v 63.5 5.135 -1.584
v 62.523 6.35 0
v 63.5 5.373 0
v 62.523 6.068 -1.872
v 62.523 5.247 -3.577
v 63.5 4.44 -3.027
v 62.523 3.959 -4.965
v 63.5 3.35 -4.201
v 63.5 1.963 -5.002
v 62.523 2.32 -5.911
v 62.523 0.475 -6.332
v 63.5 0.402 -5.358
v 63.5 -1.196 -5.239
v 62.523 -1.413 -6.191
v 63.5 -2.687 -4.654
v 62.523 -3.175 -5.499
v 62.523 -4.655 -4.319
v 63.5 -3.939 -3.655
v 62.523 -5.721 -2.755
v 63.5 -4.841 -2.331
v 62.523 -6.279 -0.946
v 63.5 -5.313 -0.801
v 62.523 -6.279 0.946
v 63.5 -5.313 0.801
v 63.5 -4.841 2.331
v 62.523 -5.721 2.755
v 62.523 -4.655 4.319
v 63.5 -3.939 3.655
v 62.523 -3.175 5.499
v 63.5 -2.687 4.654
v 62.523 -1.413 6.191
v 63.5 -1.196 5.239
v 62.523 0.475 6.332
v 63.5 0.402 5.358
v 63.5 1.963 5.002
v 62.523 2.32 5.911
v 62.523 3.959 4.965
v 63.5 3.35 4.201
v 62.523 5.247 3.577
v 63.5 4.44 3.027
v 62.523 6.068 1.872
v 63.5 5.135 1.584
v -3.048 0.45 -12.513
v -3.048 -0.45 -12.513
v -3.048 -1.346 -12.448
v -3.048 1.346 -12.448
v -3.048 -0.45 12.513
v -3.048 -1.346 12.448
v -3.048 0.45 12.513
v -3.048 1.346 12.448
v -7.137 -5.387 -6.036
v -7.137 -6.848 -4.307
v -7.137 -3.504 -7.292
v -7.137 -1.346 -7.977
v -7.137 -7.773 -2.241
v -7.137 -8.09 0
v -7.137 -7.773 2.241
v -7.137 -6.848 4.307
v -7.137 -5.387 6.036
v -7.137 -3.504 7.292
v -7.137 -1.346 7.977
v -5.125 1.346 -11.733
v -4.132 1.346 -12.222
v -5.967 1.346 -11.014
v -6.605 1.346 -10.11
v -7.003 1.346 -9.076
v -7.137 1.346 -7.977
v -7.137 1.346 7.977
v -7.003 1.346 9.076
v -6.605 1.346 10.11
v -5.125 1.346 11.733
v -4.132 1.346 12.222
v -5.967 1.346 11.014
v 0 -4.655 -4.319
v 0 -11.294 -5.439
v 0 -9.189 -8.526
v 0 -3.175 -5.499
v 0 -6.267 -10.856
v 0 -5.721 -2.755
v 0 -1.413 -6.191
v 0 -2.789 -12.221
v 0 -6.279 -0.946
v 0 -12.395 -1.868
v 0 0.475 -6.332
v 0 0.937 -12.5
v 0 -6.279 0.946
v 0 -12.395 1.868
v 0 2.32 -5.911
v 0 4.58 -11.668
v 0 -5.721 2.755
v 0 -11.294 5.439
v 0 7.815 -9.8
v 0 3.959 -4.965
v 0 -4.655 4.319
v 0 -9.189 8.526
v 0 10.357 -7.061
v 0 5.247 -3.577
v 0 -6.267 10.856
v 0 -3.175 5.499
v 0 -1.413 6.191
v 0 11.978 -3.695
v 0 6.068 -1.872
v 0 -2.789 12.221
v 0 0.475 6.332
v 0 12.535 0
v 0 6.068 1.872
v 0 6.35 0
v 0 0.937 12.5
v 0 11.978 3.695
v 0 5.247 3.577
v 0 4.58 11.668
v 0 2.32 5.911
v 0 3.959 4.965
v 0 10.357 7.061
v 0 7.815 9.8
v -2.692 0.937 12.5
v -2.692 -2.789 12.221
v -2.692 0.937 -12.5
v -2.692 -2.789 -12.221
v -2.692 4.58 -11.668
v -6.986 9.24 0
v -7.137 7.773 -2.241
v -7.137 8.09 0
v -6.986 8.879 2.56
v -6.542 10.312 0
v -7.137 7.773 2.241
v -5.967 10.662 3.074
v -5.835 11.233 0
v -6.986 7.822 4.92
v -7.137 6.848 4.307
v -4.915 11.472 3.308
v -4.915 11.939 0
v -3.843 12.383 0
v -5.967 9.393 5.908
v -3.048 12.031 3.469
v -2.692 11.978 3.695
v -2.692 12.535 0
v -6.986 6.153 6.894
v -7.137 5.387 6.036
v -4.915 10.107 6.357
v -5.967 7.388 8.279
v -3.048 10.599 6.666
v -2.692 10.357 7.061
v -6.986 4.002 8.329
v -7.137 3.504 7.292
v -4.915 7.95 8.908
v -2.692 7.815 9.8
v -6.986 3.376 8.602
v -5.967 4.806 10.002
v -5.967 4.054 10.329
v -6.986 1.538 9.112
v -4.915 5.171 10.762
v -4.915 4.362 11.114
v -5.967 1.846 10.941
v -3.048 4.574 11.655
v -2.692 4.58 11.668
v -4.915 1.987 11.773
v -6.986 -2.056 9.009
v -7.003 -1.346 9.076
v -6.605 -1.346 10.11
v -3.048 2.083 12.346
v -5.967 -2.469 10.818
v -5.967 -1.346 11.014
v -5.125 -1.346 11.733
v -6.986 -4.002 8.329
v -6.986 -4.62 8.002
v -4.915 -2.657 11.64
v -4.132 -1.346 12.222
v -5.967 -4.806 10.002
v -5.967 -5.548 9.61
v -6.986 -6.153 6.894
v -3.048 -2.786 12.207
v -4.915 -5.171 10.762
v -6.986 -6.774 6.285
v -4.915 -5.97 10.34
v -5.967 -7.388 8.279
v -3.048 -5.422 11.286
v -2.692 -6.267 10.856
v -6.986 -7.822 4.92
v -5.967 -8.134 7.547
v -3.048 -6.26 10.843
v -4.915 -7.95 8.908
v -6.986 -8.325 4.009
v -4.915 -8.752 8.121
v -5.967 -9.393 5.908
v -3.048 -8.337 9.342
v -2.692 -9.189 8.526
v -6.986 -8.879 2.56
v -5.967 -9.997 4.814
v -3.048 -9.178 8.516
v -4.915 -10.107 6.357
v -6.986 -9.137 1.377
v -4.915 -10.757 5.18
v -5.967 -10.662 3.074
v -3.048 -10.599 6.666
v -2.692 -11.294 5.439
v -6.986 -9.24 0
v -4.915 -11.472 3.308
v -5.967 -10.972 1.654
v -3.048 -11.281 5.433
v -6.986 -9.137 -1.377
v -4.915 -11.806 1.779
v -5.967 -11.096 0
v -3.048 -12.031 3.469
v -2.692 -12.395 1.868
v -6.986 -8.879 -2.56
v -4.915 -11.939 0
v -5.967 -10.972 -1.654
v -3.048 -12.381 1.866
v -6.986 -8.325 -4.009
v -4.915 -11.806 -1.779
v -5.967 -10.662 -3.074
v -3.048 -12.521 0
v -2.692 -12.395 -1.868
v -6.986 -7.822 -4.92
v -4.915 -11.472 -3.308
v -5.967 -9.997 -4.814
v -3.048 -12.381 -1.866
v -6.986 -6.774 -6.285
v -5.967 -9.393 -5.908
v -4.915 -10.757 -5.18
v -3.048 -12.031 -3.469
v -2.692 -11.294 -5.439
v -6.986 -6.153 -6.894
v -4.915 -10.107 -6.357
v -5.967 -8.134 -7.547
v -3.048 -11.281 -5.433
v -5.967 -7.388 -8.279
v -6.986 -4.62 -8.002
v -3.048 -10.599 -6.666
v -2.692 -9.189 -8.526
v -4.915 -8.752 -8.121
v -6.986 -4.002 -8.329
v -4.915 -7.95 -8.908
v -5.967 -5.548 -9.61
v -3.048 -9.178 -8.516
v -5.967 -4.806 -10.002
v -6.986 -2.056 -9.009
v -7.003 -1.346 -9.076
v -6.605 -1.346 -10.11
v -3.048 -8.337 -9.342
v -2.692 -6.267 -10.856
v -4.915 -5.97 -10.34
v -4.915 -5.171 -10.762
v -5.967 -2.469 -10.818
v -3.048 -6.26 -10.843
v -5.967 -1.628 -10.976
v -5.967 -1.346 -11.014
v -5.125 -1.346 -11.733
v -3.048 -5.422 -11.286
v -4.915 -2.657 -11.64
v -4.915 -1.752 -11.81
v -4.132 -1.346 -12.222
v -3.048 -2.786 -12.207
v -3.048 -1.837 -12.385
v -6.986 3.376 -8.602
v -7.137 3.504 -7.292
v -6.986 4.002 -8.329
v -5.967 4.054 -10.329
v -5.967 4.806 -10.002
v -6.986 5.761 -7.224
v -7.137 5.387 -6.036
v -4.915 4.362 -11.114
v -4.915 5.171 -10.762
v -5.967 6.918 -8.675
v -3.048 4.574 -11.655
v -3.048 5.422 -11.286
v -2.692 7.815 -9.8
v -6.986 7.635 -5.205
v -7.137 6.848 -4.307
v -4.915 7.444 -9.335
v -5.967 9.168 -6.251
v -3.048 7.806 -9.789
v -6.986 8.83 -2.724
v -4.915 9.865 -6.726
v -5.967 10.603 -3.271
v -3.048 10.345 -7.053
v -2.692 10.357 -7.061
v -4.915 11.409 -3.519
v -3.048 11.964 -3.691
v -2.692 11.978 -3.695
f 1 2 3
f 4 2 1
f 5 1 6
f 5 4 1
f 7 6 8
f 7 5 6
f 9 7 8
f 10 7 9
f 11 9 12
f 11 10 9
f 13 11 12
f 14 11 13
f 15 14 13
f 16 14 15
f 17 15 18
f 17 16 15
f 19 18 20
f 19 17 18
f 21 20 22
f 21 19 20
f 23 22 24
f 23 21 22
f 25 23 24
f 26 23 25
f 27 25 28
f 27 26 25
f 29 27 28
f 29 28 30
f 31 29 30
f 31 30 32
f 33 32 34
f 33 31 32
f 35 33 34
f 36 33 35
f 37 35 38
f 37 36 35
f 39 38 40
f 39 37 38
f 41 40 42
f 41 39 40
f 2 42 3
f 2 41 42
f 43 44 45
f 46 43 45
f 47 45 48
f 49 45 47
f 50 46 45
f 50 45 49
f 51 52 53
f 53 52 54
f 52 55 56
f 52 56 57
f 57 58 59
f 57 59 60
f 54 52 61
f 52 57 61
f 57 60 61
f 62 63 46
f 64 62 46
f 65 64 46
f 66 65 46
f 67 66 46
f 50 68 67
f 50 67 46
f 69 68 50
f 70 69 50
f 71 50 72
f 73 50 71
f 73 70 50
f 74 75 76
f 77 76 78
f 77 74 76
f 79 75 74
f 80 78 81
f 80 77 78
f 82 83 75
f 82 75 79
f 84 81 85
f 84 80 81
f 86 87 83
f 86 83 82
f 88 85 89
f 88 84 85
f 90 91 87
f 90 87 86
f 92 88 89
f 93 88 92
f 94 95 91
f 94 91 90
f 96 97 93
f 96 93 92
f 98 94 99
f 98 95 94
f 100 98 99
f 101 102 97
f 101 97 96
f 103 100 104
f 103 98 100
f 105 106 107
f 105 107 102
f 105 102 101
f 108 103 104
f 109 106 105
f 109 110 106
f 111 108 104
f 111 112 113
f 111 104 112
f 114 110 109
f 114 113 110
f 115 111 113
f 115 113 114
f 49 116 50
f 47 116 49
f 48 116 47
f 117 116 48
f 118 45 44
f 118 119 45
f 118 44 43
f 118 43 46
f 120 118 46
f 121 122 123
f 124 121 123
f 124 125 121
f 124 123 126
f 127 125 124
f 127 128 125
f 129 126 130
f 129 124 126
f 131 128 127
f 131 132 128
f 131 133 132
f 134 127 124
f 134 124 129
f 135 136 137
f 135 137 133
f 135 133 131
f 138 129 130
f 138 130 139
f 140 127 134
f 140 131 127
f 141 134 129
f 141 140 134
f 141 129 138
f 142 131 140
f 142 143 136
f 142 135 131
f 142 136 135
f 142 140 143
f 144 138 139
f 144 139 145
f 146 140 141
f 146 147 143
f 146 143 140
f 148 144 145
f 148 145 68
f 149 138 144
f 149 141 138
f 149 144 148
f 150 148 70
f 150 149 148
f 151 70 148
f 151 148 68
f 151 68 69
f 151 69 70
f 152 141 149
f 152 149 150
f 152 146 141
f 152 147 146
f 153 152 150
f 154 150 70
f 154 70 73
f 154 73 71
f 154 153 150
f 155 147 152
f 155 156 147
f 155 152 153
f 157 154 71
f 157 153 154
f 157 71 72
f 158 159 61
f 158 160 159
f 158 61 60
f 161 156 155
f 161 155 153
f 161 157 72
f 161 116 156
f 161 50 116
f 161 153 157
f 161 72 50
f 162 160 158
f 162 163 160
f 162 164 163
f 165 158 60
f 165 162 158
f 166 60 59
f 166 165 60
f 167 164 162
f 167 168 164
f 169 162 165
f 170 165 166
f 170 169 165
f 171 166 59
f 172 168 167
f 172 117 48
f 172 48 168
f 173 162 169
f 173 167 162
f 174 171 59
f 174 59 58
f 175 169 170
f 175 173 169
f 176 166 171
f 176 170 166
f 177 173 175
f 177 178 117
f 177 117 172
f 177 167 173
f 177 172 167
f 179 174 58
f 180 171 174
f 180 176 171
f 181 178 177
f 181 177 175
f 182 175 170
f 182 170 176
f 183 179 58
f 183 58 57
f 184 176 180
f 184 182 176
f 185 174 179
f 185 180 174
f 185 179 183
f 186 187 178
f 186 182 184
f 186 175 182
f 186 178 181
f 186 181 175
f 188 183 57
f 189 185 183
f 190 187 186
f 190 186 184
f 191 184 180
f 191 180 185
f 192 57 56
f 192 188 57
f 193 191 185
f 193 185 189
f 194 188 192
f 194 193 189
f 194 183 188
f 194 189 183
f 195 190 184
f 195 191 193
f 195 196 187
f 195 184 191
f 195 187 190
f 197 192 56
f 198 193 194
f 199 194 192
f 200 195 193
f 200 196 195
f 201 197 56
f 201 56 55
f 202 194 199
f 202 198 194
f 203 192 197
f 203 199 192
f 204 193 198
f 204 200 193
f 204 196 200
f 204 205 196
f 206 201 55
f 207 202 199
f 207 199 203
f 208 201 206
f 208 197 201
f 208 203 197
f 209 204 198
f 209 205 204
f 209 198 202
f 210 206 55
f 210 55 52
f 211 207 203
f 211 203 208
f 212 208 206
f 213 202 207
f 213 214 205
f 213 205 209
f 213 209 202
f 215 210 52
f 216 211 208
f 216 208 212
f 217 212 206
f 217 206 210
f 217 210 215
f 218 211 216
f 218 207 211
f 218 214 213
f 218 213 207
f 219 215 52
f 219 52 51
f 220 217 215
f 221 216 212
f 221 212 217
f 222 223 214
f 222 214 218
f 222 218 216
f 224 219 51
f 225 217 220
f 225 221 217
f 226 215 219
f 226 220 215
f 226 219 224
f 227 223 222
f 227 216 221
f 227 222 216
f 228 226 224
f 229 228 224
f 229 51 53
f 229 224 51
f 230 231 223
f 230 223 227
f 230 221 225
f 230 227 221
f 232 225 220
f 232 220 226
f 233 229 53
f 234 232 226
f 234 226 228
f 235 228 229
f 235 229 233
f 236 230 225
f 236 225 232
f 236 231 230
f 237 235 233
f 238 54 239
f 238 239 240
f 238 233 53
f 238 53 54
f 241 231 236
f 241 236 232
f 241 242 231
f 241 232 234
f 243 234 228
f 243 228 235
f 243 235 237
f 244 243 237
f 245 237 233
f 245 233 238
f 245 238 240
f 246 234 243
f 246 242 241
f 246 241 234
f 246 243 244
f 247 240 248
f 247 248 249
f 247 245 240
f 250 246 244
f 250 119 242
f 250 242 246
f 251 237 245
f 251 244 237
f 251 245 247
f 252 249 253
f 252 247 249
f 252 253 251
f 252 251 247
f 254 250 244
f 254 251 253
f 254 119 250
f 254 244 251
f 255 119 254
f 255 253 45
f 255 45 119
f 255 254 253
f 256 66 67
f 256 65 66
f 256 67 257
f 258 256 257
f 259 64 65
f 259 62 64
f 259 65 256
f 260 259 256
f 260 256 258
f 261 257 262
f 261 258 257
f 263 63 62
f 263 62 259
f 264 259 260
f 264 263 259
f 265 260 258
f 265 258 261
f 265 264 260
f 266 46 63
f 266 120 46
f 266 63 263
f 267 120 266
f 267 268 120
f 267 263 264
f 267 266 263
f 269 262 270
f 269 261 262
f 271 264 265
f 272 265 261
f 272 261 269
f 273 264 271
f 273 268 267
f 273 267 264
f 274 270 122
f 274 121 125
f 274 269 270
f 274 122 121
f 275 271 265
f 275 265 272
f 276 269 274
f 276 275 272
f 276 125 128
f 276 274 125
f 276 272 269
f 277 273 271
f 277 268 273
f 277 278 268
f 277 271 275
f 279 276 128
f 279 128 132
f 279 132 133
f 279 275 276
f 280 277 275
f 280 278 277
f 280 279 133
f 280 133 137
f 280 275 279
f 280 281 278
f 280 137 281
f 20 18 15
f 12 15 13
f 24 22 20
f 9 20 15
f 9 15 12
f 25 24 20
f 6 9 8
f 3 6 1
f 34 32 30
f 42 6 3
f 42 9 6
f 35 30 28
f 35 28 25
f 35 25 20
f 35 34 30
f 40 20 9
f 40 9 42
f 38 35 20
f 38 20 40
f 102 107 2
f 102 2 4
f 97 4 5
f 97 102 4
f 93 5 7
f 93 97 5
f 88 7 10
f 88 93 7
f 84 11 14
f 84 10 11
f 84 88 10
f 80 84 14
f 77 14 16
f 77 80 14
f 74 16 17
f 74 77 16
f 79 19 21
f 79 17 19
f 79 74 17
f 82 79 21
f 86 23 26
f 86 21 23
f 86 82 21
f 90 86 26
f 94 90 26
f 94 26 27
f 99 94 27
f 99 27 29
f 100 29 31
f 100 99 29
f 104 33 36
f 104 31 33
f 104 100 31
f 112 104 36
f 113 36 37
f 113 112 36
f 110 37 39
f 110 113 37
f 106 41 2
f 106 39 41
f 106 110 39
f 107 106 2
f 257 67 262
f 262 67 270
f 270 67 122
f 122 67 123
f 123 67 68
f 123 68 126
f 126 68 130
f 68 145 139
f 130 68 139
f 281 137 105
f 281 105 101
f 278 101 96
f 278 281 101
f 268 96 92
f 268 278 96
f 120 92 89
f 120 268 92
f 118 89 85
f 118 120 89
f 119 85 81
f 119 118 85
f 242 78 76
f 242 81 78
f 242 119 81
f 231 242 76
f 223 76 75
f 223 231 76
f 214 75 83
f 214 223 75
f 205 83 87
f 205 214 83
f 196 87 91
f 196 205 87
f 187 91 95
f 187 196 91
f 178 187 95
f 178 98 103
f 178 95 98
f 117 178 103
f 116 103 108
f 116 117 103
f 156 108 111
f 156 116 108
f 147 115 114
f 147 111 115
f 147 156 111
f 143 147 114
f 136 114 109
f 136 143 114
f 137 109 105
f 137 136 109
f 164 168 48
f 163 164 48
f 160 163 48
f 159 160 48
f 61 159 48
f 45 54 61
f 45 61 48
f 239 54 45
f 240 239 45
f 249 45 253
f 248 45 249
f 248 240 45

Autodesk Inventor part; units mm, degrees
ref_plane "YZ Plane" through (0, 0, 0) normal (1, 0, 0) x (0, 1, 0)
ref_plane "XZ Plane" through (0, 0, 0) normal (0, 1, 0) x (-1, 0, 0)
sketch "Sketch1" plane through (0, 0, 0) normal (0, 0, 1) x (1, 0, 0)
  line L0 (-7.1374, 0) -> (63.5, 0)
  line L1 (63.5, 0) -> (63.5, 6.35)
  line L2 (63.5, 6.35) -> (9.525, 6.35)
  line L3 (9.525, 6.35) -> (8.5483, 6.35)
  line L4 (8.5483, 6.35) -> (0, 6.35)
  line L5 (0, 6.35) -> (0, 12.5349)
  line L6 (-21.2649, 0) -> (77.6275, 0) projected
  line L7 (0, -2.507) -> (0, 15.0419) projected
  line L8 (-7.1374, 0) -> (-7.1374, 12.5349)
  line L9 (0, 12.5349) -> (-7.1374, 12.5349)
  line L10 (9.525, 6.35) -> (0, 6.35) construction
  dimension "d0" = 63.5
  dimension "d1" = 53.975
  dimension "d2" = 0.9767
  dimension "d3" = 7.1374
  dimension "d4" = 12.7
  dimension "d5" = 12.7
  dimension "d9" = 25.0698
  dimension "d10" = 0
revolve "Body" add sketch "Sketch1" angle 360 about axis through (-7.1374, 0, 0) along (1, 0, 0)
sketch "Sketch2" plane through (-7.1374, 0, 0) normal (-1, 0, 0) x (0, 0, 1)
  circle A0 centre (0, 0) radius 12.5349 projected
  line L0 (0, 0) -> (0, 12.5349) projected
  line L1 (-12.5349, 1.3462) -> (12.5349, 1.3462)
  line L2 (12.5349, 1.3462) -> (12.5349, -1.3462)
  line L3 (12.5349, -1.3462) -> (-12.5349, -1.3462)
  line L4 (-12.5349, -1.3462) -> (-12.5349, 1.3462)
  line L5 (-12.5349, 0) -> (12.5349, 0) construction
  line L6 (0, 1.3462) -> (0, -1.3462) construction
  dimension "d11" = 2.6924
  dimension "d12" = 25.0698
fillet "Fillet1" radius 4.445 1 edges at (-7.1374, -12.5349, 0)
extrude "Slot" cut sketch "Sketch2" against normal blind 4.0894 contours A0 L3 L1 | L2 L3 A0 | A0 L1 L2 | L3 L4 A0 | A0 L4 L1
thread "Thread" size "1/2-13 UNC" class "2A" standard "ANSI Unified Screw Threads" length 53.975
chamfer "Chamfer1" distance 0.9766 distance2 0.9767 1 edges at (63.5, -6.35, 0) measured on face at (63.5, 0.6891, 1.4726)
ref_plane "Work Plane1" through (30.1625, 0, 0) normal (0, 0, -1) x (1, 0, 0)
equation "\"d11\" = SBR"
equation "\"d12\" = KOD"
equation "\"d14\" = RR"
equation "\"d19\" = STI"
equation "\"d15\" = GEL"
equation "\"d17\" = -0.5 * SPD + 0.5 * GD"
equation "\"d0\" = NLG"
equation "\"d1\" = GEL"
equation "\"d3\" = KOH"
equation "\"d4\" = GD"
equation "\"d5\" = BDM"
equation "\"d9\" = KOD"
equation "\"GD\" = NND"
equation "\"NLG\" = 63.5"
equation "\"GEL\" = 53.975"
equation "\"KOD\" = 25.0698"
equation "\"KOH\" = 7.1374"
equation "\"GAL\" = 0.97663"
equation "\"SPD\" = GD1"
equation "\"BDM\" = NND"
equation "\"GUL\" = 0.97663"
equation "\"RR\" = 4.445"
equation "\"SBR\" = 2.6924"
equation "\"STI\" = 4.0894"
equation "\"KEWI\" = 0"
equation "\"THREADDIA\" = 12.7"
equation "\"TOA\" = 30deg"
equation "\"NND\" = 12.7"
equation "\"GD1\" = 10.74674"
properties part number "ANSI B18.6.3 - 1/2 - 13 x 2 1/2 SP HMS" material "Steel, Mild"
